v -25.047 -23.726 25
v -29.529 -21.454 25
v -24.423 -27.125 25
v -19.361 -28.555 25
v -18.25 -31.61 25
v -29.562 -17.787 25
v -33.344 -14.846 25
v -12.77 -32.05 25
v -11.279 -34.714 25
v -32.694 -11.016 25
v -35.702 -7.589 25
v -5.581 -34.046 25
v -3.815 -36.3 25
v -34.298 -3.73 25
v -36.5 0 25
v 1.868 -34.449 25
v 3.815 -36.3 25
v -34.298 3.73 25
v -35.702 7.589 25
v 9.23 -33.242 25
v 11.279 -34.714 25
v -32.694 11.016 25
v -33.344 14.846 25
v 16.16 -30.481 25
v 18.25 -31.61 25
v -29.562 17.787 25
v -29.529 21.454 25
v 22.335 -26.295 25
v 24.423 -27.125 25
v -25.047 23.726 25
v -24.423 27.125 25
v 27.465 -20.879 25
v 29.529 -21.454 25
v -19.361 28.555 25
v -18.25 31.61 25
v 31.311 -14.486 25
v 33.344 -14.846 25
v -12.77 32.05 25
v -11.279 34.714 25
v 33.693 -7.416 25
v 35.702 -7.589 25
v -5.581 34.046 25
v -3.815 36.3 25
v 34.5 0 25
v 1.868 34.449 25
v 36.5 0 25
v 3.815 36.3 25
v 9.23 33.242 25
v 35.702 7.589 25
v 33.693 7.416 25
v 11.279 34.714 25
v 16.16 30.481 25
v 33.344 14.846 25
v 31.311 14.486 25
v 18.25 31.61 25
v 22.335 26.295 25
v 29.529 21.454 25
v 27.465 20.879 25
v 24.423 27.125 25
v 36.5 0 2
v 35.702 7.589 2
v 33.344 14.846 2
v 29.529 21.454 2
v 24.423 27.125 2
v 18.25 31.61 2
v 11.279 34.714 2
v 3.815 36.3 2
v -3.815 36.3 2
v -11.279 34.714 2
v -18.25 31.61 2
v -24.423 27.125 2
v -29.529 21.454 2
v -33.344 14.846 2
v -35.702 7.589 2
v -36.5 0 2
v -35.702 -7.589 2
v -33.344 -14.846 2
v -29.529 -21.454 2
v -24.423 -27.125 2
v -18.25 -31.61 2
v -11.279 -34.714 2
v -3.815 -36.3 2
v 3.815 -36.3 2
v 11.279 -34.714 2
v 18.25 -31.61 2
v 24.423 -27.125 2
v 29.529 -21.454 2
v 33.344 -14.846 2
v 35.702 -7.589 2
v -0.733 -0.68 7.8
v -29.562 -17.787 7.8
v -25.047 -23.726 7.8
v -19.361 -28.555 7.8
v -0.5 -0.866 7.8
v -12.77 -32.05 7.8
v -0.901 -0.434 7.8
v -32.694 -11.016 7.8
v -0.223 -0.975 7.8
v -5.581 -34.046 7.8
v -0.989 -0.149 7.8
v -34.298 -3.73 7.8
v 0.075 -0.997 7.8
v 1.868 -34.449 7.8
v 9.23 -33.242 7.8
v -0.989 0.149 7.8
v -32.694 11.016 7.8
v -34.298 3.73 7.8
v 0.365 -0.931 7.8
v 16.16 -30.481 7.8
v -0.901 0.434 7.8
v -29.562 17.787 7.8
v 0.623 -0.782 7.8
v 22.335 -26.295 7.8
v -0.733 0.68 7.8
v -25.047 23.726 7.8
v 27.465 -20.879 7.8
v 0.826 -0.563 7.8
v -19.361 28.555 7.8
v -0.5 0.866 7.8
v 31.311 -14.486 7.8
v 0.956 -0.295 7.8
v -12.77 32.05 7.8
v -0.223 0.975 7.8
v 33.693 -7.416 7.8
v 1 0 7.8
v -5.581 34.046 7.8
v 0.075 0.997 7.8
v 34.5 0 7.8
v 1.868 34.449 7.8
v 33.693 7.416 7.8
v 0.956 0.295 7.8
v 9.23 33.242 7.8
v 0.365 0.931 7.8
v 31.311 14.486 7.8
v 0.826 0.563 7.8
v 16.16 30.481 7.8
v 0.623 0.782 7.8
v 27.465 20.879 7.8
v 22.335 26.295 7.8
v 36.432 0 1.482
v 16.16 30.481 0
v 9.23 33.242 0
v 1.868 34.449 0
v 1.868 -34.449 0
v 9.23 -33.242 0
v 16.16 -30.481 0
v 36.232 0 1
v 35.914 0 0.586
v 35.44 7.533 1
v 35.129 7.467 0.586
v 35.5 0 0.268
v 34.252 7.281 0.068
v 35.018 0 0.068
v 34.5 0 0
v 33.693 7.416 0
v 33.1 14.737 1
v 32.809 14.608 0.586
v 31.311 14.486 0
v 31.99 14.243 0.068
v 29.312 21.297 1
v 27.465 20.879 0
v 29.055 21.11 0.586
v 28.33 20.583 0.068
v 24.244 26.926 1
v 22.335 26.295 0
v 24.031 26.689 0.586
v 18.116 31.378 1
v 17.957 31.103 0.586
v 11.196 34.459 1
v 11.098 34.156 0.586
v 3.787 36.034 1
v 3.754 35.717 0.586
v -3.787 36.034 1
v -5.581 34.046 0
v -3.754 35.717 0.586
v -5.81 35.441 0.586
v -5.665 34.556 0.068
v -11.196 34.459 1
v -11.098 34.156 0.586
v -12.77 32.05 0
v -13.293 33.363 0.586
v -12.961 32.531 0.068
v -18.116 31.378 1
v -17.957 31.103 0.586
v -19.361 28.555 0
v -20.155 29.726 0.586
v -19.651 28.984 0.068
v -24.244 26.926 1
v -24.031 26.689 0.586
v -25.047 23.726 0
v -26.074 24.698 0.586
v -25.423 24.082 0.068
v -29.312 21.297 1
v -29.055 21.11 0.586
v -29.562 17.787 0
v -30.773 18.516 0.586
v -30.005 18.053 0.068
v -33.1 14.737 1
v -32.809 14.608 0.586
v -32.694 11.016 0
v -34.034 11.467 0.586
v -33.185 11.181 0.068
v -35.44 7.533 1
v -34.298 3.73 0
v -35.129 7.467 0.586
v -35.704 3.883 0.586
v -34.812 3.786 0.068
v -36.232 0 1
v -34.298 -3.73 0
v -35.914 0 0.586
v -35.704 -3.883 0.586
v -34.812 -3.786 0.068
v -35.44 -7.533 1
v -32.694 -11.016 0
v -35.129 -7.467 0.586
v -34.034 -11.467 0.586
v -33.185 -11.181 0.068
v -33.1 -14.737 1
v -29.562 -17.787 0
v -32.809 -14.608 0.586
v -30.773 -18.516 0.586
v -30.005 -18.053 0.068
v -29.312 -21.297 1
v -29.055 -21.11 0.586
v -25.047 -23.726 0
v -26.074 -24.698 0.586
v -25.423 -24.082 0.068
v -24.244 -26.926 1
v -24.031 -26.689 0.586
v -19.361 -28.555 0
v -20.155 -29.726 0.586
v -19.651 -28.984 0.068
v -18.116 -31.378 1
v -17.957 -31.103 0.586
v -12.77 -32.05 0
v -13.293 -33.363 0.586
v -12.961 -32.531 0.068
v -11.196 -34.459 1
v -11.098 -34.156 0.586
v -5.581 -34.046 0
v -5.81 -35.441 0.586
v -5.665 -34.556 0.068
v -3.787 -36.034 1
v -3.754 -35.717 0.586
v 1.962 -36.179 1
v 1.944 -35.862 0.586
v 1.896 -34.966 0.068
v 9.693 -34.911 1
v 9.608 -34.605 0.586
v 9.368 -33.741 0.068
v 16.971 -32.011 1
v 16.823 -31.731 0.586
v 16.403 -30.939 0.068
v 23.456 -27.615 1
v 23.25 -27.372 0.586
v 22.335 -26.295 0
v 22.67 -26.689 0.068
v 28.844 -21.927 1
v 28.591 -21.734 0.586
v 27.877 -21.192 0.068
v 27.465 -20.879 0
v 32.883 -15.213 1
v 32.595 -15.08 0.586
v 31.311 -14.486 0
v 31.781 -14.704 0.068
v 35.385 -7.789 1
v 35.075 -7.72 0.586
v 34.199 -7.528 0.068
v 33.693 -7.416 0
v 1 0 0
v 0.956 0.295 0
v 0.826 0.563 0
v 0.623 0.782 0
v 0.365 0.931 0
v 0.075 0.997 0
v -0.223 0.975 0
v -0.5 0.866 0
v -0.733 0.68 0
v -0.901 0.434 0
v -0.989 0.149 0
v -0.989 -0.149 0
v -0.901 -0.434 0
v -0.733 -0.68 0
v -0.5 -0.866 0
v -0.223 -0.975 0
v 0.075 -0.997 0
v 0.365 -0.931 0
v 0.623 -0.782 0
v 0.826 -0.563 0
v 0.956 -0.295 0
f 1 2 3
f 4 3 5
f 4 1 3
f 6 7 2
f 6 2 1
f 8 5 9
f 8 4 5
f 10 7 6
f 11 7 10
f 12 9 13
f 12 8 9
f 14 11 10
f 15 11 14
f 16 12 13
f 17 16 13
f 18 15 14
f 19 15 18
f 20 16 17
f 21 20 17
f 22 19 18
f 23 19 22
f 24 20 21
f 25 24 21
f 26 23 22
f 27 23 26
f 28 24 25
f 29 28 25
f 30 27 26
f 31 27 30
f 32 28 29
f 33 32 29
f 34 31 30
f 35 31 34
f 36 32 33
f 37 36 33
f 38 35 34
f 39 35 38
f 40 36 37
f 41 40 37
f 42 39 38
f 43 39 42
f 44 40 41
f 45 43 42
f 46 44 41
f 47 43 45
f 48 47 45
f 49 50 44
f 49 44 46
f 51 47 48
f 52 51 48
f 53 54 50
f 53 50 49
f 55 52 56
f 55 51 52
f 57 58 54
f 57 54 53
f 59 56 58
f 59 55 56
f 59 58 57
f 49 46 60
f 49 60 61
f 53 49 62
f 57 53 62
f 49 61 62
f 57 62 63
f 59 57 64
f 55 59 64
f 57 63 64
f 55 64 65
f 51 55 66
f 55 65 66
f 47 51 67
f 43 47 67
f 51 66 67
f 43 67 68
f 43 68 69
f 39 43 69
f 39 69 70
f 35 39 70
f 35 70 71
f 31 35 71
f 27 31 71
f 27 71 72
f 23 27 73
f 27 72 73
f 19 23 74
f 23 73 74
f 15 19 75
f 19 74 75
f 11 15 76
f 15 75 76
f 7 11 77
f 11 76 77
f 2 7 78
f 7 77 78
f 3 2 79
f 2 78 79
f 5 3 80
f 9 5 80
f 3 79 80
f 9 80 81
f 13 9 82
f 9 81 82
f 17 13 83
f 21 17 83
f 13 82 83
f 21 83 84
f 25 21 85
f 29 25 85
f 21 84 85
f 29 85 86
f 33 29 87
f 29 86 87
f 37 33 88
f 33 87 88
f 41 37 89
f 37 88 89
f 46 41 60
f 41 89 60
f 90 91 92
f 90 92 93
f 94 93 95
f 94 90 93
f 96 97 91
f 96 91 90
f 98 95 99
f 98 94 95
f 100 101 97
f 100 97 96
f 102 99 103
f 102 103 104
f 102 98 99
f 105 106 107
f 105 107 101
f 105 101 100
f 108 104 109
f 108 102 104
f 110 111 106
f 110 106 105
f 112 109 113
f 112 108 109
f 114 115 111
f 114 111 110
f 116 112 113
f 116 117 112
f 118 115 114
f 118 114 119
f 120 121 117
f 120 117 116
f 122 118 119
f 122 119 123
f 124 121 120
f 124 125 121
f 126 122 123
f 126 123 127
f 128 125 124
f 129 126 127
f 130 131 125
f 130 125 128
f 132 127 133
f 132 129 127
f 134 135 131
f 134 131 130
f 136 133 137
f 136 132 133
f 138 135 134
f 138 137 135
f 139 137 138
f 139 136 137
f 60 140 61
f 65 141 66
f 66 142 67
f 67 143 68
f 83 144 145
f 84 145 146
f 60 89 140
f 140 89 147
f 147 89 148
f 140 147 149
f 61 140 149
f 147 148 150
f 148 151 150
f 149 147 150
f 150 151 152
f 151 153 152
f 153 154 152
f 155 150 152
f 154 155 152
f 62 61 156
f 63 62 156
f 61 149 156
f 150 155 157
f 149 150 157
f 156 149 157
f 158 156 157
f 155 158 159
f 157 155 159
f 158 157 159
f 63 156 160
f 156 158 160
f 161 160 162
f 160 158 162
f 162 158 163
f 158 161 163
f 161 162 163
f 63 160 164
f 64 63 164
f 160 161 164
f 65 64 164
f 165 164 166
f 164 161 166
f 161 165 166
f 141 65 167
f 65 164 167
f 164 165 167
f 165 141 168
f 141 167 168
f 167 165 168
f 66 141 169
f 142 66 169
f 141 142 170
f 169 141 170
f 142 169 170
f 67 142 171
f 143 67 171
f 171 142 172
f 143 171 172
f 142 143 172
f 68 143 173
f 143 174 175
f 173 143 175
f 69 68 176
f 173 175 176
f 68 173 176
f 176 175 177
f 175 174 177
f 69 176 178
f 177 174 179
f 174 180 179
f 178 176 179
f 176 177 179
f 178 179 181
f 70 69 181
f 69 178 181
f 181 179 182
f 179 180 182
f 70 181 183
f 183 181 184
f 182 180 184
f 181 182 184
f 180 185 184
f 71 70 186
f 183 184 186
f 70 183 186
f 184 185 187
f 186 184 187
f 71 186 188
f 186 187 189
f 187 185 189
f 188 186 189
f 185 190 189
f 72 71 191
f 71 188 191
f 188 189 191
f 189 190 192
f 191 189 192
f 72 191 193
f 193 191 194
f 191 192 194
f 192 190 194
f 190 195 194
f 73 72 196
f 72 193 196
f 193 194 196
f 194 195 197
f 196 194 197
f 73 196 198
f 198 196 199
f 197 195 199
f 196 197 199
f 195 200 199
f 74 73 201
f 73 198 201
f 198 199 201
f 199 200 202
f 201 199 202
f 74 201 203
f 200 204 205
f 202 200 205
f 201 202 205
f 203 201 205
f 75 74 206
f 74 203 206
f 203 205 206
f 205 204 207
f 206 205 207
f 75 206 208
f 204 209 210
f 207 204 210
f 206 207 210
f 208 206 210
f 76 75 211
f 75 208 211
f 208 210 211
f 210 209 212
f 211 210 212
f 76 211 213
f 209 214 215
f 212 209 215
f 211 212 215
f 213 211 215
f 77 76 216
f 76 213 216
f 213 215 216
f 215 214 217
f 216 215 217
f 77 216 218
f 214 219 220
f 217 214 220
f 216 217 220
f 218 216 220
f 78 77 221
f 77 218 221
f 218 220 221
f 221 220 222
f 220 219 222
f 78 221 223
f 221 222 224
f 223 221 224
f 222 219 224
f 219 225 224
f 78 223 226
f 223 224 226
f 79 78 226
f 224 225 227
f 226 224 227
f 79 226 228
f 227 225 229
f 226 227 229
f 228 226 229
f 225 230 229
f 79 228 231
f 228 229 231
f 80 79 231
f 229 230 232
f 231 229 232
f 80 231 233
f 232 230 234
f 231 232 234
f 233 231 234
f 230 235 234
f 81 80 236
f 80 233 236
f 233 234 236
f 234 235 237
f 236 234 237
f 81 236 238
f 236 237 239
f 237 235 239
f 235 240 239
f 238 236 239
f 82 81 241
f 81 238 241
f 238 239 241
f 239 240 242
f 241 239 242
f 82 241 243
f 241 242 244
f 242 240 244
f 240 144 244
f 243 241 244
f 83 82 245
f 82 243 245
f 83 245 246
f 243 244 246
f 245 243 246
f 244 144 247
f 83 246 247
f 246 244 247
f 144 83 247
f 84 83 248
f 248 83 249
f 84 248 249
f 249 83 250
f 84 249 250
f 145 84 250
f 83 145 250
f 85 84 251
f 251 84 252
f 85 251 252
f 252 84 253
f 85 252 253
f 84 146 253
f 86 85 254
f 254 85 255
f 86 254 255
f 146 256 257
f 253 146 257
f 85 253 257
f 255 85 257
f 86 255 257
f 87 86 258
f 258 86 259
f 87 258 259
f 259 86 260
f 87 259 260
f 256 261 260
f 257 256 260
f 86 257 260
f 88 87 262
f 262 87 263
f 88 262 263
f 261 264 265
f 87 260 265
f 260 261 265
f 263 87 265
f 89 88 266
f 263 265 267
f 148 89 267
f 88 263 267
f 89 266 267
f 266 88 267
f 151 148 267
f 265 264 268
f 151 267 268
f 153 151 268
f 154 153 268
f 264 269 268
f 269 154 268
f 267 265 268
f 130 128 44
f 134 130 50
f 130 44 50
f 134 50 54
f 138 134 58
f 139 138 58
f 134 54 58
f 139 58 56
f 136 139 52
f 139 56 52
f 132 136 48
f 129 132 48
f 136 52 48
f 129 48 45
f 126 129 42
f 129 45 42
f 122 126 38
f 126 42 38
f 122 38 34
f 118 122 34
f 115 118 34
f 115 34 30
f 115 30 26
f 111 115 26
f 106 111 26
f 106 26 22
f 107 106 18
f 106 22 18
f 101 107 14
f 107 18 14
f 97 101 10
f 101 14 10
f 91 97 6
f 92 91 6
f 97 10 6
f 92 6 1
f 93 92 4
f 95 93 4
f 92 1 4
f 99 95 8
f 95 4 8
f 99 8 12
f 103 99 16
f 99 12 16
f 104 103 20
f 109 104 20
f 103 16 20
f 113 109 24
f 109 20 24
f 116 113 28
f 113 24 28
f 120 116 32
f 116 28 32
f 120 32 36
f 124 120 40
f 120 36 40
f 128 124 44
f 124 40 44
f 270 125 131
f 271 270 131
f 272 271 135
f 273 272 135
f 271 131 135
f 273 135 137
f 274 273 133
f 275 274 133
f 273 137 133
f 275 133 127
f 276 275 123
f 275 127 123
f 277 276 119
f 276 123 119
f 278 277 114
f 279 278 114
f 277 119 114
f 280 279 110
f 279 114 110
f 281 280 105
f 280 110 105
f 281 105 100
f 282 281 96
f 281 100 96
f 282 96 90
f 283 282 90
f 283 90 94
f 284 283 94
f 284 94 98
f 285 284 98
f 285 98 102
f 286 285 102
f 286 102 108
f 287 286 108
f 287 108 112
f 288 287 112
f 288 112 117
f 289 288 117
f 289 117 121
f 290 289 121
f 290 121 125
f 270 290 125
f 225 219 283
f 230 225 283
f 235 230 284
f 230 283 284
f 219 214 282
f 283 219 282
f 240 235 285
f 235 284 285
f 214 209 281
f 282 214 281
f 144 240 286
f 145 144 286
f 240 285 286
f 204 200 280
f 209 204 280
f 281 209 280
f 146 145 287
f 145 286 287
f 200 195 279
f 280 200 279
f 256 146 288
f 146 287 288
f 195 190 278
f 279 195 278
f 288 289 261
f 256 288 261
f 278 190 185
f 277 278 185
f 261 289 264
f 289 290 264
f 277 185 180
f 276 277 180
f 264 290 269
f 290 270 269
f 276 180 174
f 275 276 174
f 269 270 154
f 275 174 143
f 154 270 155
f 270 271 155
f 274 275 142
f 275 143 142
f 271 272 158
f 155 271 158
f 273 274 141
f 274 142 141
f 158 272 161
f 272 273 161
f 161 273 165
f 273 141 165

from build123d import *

# Parameters (mm, degrees)
F0_R     = 36.5
F1_DEPTH = 25
F2_R     = 2
F3_R     = 34.5
F4_DEPTH = 17.2
F5_R     = 1
F6_DEPTH = 25


with BuildPart() as f1:
    # F0 (on Top) → F1 (new body)
    with BuildSketch(Plane.XY):
        Circle(F0_R)
    extrude(amount=F1_DEPTH)

    # F2
    f2_edges = [f1.edges().sort_by_distance(p)[0] for p in [
        (-36.5, 0, 0),
    ]]
    fillet(f2_edges, radius=F2_R)

    # F3 (on face) → F4 (cut)
    with BuildSketch(Plane.XY.offset(25)):
        Circle(F3_R)
    extrude(amount=-F4_DEPTH, mode=Mode.SUBTRACT)

    # F5 (on face) → F6 (cut)
    with BuildSketch(Plane.XY.offset(7.8)):
        Circle(F5_R)
    extrude(amount=-F6_DEPTH, mode=Mode.SUBTRACT)


solid = f1.part
